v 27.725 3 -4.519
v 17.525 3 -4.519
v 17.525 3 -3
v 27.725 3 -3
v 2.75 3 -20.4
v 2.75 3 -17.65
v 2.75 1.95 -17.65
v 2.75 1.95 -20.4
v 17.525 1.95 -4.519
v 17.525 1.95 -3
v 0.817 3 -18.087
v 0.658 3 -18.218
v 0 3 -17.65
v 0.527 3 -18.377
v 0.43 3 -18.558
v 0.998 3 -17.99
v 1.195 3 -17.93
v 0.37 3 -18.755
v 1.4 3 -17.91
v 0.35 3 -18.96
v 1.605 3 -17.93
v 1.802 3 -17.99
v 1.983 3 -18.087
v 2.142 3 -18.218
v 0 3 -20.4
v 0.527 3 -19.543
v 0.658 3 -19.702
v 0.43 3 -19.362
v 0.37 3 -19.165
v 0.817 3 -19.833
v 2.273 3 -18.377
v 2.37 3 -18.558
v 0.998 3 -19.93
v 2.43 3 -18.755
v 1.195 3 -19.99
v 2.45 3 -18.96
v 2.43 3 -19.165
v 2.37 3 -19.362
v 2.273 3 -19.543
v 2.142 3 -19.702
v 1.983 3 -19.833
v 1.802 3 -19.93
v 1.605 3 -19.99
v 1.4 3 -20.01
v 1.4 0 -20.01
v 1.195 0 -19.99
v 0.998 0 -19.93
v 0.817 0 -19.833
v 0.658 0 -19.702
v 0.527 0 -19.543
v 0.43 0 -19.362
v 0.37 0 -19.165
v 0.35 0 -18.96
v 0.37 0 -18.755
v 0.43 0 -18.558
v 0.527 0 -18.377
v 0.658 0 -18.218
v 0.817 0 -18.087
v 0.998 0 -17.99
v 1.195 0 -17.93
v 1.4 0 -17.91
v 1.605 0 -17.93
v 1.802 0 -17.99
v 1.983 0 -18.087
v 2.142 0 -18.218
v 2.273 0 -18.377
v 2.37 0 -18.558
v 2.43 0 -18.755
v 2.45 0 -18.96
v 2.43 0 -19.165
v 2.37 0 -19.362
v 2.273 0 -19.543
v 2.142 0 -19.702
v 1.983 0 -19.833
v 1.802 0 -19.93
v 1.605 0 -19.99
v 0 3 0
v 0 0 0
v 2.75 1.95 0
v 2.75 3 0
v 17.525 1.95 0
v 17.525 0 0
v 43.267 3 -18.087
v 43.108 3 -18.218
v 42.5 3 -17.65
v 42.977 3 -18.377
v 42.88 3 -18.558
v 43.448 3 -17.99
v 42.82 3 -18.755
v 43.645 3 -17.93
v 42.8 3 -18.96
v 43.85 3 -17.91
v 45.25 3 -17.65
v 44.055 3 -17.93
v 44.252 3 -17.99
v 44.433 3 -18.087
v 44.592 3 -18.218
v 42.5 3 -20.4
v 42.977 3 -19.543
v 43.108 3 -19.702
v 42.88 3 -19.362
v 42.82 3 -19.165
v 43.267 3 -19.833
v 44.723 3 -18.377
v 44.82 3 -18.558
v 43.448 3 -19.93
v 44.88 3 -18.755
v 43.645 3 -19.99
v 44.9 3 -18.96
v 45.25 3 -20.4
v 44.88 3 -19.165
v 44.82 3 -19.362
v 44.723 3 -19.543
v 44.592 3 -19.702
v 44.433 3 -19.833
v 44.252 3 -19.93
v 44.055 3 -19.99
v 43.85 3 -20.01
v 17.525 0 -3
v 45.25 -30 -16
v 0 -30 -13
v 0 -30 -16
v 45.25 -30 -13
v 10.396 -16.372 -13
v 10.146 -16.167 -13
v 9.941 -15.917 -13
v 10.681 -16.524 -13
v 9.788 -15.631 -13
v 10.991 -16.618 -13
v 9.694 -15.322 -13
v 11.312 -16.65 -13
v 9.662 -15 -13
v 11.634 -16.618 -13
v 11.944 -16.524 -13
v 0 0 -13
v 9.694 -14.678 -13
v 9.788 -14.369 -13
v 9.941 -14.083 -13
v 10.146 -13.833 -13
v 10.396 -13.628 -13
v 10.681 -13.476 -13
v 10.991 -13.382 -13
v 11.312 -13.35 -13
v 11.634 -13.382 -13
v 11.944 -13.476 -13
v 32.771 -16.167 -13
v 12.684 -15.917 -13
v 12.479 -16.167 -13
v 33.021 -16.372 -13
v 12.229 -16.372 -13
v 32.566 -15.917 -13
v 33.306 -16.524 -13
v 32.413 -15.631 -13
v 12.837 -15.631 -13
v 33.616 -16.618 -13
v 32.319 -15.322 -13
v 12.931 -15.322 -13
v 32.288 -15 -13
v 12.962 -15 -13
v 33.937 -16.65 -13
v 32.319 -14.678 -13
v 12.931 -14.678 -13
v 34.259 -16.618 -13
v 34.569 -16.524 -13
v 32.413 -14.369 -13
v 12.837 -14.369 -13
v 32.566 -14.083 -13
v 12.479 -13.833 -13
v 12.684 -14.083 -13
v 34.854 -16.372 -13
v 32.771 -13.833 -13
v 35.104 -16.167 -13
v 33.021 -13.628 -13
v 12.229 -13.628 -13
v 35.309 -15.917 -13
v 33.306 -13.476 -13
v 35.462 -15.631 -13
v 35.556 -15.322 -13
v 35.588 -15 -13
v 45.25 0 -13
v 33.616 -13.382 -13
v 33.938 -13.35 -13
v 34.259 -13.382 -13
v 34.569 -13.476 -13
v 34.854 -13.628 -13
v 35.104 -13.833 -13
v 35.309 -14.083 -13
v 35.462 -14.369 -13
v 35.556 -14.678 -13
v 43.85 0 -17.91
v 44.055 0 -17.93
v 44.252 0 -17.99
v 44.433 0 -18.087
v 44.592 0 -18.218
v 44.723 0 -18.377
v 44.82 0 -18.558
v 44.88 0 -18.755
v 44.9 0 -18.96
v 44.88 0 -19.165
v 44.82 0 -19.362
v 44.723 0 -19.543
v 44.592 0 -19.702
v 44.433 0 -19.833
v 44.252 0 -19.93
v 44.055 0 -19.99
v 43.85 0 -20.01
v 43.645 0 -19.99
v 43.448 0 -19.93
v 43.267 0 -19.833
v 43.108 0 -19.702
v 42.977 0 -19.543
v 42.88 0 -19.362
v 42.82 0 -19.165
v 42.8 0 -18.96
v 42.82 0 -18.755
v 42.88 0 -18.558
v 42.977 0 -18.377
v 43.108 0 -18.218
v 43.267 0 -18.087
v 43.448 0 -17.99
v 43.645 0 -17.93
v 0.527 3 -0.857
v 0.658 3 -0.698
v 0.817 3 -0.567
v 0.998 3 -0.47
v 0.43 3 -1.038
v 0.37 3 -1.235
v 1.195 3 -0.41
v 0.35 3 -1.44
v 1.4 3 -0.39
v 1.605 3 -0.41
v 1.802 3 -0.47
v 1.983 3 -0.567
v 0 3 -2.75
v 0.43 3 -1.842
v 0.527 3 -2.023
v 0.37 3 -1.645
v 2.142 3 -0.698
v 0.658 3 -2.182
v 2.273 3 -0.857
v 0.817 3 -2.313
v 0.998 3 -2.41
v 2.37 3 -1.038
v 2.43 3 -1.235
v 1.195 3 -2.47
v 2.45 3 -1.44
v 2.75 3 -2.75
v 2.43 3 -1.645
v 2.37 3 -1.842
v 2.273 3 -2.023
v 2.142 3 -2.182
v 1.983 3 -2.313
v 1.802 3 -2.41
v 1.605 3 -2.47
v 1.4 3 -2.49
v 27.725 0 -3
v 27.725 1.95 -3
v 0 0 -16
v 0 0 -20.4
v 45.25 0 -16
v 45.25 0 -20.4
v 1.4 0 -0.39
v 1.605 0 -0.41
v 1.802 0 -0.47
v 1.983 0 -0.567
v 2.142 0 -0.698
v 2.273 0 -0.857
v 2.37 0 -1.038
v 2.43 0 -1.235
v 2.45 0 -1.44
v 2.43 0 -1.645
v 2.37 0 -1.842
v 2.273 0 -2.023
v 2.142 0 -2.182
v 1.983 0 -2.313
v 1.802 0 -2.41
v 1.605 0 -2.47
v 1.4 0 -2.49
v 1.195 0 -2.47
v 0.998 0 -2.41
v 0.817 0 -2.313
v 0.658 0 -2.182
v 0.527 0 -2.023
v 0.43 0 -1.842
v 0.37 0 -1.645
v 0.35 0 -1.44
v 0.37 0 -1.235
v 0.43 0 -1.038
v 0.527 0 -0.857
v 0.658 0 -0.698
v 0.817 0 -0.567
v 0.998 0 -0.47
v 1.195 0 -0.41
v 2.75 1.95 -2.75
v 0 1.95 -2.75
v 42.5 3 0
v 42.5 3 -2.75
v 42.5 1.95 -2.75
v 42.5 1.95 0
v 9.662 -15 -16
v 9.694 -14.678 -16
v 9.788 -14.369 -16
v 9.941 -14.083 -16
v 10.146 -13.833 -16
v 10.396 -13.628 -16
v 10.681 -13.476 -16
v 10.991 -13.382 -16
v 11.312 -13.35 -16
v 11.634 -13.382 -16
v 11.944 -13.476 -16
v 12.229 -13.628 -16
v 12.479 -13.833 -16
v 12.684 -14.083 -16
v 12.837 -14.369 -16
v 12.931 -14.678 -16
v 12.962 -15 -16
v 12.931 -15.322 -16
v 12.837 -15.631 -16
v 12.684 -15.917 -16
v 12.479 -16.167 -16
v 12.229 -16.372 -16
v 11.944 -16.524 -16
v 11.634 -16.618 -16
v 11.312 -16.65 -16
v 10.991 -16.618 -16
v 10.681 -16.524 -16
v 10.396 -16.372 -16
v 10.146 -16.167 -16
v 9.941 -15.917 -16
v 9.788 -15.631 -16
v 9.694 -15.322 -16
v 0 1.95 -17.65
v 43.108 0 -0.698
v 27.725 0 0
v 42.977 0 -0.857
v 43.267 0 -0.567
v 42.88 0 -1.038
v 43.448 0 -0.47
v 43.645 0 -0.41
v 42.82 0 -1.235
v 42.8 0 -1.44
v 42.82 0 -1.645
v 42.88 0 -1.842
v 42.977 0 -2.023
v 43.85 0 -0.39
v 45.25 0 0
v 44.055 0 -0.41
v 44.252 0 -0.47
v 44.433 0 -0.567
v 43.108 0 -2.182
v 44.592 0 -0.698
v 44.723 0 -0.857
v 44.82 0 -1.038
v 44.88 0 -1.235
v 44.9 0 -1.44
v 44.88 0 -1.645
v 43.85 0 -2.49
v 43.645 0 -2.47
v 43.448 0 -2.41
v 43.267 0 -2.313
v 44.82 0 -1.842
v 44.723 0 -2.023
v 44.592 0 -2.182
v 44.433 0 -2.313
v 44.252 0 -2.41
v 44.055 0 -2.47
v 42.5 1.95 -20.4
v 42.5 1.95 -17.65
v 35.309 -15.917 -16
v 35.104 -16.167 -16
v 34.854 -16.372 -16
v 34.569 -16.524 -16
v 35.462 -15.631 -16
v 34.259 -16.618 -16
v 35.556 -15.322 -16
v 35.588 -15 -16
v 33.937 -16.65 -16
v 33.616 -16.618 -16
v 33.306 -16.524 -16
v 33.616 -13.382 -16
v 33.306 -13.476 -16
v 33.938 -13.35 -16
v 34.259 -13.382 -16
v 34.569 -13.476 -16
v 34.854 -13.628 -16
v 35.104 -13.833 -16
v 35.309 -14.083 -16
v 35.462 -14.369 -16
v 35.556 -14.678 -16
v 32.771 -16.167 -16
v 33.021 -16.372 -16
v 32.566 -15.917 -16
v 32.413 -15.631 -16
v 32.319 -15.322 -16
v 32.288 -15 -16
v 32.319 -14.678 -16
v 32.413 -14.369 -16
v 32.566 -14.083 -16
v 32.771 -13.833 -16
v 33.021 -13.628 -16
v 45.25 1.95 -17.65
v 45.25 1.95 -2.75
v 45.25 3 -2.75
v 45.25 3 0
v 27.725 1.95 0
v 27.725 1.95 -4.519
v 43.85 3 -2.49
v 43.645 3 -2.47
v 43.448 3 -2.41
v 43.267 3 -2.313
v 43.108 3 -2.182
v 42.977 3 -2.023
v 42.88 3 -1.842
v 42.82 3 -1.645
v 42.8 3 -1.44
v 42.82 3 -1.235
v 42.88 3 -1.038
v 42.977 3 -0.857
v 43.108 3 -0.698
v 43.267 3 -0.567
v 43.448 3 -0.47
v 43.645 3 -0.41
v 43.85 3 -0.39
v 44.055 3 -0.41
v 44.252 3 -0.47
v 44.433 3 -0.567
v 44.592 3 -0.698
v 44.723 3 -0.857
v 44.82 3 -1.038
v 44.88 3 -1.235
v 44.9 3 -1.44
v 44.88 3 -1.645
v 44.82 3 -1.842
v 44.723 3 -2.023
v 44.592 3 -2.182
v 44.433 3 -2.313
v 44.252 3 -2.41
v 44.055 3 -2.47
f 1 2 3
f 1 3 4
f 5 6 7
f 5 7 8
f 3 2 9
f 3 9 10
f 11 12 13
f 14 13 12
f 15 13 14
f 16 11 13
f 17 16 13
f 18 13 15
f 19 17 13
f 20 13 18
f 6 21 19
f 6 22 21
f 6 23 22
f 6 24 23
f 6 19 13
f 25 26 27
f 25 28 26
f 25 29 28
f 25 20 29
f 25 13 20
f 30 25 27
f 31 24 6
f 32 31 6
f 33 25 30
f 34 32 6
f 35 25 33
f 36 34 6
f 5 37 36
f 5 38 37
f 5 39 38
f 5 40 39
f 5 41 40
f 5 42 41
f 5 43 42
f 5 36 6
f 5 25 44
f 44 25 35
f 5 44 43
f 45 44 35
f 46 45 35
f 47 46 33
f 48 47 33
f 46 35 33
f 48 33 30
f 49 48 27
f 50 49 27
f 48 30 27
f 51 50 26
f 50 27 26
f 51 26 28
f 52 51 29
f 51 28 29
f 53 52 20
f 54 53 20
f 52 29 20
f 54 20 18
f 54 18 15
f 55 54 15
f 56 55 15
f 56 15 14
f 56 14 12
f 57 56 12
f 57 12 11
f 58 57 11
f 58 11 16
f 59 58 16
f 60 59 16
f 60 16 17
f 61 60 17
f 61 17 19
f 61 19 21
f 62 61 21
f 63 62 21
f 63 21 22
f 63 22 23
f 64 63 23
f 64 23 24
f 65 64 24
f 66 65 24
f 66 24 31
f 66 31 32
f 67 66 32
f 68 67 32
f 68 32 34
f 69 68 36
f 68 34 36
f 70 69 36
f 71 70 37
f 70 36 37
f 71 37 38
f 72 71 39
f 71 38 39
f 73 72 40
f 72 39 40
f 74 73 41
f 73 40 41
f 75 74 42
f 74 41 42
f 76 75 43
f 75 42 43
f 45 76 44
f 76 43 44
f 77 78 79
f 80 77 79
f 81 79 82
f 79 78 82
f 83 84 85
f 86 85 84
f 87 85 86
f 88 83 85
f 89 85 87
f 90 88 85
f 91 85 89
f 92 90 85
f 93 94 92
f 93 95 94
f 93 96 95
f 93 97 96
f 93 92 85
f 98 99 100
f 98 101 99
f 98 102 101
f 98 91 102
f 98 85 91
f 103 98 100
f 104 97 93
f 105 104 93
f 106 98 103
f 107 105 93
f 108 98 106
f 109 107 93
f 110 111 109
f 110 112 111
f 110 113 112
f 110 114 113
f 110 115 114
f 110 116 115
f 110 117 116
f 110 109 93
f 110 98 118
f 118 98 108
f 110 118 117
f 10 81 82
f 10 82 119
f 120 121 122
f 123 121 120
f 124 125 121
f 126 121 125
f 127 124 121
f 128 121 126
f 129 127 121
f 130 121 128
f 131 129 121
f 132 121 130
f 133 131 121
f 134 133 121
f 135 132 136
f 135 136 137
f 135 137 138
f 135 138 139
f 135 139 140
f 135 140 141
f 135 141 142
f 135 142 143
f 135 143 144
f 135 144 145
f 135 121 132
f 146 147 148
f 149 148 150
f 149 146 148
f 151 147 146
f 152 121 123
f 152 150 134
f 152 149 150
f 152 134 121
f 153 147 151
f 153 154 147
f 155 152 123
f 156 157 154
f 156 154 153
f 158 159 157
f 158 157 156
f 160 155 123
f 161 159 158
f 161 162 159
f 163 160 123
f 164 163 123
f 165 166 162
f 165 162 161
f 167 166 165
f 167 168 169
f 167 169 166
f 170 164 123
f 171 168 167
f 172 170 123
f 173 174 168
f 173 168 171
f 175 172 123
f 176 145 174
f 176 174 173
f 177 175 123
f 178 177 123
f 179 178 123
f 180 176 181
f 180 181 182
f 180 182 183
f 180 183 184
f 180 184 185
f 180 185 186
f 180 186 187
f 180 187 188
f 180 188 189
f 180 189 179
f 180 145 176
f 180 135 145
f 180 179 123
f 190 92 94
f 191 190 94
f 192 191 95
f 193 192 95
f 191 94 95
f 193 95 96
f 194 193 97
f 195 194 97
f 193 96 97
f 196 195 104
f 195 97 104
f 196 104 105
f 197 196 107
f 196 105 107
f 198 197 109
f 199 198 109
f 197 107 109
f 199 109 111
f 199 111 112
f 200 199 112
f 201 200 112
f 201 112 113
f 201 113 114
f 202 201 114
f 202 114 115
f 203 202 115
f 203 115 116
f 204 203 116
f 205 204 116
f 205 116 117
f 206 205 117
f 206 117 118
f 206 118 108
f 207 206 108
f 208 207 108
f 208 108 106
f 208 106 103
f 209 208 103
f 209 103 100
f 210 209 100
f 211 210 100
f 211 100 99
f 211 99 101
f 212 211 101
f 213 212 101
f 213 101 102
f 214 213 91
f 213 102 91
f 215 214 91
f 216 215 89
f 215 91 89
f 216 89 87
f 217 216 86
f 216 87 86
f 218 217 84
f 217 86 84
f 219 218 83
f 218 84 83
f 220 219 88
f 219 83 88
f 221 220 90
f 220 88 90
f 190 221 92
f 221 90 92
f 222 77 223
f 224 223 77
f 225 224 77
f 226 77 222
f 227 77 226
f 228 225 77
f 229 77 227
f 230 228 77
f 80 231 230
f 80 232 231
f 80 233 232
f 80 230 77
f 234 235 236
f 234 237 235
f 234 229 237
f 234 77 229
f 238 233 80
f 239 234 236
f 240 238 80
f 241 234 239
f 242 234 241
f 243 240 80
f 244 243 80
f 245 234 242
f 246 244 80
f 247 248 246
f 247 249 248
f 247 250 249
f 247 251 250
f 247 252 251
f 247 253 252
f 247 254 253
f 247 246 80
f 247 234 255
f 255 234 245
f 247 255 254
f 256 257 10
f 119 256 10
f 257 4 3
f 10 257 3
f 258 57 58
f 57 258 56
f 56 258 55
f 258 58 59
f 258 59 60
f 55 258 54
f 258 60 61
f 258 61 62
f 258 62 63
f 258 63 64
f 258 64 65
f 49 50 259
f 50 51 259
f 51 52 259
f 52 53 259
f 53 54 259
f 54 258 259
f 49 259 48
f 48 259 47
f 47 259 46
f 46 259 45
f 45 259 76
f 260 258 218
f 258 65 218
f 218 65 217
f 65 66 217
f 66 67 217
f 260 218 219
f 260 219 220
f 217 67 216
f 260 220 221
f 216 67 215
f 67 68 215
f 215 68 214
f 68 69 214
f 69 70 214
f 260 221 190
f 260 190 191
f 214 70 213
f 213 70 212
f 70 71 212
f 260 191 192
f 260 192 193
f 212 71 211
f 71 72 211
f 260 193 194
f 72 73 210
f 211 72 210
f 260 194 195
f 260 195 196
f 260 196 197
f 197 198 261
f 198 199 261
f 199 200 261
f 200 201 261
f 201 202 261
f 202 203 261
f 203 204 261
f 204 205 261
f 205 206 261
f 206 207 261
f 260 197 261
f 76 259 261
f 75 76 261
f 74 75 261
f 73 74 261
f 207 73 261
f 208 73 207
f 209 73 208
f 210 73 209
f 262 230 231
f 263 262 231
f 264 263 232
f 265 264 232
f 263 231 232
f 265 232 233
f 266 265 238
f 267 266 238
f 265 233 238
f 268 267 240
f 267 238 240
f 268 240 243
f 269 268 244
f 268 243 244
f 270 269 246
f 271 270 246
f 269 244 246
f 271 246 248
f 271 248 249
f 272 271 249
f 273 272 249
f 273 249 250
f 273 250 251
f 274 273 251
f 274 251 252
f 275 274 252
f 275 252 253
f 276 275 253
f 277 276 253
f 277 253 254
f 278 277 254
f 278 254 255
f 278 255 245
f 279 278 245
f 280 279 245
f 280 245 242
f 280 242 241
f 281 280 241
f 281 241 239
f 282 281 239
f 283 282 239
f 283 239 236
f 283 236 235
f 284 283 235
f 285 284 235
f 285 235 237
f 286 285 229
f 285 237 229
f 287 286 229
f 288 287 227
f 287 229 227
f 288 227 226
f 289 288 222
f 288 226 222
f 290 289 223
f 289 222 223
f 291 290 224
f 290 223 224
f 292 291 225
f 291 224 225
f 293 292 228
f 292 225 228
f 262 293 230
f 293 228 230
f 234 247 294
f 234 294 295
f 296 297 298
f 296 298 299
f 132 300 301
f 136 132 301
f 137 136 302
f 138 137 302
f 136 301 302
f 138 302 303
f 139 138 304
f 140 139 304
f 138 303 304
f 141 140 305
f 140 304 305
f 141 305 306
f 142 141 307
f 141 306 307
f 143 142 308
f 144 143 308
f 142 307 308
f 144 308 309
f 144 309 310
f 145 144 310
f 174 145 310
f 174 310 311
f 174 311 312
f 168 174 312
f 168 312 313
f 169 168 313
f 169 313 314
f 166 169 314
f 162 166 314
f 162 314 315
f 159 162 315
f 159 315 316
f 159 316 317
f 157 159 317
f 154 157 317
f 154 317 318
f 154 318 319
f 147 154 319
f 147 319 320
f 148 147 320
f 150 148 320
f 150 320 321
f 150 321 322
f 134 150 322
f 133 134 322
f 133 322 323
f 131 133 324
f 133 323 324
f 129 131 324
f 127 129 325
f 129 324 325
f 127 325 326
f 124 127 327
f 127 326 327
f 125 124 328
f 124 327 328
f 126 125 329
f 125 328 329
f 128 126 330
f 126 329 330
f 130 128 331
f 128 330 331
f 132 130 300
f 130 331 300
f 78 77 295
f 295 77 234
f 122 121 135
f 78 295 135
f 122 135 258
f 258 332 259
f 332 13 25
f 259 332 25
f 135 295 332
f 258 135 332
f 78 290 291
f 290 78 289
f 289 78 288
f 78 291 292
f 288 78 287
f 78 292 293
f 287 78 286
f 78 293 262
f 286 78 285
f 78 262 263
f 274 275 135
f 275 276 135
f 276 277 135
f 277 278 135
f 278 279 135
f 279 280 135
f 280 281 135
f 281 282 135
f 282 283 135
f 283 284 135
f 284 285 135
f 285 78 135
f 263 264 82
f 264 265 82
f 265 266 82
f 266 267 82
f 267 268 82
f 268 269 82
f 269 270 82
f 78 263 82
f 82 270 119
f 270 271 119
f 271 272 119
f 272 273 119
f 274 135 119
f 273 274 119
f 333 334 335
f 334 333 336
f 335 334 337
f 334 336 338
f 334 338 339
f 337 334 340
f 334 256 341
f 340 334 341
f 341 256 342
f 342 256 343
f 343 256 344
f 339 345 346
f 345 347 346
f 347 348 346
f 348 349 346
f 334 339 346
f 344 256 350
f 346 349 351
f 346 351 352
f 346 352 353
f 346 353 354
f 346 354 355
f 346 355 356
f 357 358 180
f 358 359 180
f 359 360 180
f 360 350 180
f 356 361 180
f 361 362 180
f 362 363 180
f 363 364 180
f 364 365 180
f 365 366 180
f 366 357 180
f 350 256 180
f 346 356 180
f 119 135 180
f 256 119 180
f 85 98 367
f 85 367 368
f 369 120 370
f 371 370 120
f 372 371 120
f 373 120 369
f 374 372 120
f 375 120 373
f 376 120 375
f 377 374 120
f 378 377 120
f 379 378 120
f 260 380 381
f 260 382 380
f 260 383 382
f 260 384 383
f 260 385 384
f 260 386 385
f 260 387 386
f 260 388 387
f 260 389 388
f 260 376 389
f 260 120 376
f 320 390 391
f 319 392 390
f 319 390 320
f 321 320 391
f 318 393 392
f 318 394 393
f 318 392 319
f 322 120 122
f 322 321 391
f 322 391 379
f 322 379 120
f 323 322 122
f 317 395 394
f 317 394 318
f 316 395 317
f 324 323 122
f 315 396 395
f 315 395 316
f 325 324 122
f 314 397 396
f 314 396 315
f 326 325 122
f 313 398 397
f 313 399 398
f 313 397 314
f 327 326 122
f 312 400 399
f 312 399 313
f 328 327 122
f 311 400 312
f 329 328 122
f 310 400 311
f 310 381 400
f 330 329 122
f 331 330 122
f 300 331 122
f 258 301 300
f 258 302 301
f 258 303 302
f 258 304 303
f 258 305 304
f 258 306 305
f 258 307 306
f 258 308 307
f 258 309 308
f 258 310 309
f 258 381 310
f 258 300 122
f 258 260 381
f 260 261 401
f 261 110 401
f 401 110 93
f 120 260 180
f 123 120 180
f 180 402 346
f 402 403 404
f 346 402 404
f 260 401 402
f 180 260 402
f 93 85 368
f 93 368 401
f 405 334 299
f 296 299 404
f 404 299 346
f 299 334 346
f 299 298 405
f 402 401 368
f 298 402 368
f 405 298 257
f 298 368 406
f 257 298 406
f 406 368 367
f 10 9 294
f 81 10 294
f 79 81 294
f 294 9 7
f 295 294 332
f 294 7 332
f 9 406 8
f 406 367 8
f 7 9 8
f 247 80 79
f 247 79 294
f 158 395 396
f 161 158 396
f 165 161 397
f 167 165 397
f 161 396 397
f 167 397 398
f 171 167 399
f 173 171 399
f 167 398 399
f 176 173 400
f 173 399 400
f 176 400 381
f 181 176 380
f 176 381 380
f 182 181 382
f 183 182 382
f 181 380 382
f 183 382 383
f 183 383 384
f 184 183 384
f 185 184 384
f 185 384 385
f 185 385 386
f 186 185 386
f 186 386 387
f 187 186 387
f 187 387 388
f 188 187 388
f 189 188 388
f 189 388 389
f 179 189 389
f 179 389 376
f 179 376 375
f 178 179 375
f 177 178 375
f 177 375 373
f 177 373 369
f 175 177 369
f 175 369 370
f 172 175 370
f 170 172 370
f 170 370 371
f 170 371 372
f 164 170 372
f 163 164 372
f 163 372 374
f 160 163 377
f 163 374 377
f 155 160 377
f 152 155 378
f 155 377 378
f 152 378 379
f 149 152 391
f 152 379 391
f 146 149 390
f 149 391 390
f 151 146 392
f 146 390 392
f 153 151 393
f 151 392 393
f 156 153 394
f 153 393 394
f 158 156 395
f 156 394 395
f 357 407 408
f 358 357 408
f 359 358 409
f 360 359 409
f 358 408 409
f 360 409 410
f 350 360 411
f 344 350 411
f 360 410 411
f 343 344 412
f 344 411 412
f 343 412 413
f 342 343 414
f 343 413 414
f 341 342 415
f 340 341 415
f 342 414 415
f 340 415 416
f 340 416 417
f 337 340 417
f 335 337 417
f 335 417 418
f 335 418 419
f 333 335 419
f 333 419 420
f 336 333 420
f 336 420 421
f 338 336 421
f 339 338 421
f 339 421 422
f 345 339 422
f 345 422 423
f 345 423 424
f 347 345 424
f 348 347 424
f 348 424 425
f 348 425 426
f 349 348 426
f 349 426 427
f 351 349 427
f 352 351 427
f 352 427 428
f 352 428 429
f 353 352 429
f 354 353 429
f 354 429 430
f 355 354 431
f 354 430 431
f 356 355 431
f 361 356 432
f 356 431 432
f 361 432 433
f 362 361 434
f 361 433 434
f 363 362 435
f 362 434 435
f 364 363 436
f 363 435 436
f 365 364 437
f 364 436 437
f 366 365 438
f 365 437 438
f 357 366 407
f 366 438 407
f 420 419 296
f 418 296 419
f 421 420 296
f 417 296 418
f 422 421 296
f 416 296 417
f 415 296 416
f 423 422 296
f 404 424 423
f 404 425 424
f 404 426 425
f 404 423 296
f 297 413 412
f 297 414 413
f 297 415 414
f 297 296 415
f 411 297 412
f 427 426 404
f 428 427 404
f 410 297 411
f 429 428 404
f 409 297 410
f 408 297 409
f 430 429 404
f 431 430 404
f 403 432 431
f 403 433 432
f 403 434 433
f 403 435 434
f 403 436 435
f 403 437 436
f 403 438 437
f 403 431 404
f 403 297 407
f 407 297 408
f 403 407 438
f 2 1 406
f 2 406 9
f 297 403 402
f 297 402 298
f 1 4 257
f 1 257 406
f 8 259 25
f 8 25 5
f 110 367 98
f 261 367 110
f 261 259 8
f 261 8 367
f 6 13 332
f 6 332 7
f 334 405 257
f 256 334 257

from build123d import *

# Parameters (mm, degrees)
CROQUIS1_W              = 45.25
CROQUIS1_H              = 20.4
SALIENTE_EXTRUIR1_DEPTH = 3
CROQUIS2_W              = 10.2
CROQUIS2_H              = 3
CORTAR_EXTRUIR1_DEPTH   = 50.726476851
CORTAR_EXTRUIR2_DEPTH   = 1.05
CROQUIS5_R              = 1.05
CORTAR_EXTRUIR4_DEPTH   = 50.726476851
SALIENTE_EXTRUIR2_DEPTH = 30
CROQUIS8_W              = 45.25
CROQUIS8_H              = 30
CORTAR_EXTRUIR5_DEPTH   = 10
CROQUIS10_R             = 1.65
CORTAR_EXTRUIR6_DEPTH   = 58.197574249
CROQUIS11_W             = 45.25
CROQUIS11_H             = 30
CORTAR_EXTRUIR7_DEPTH   = 2


with BuildPart() as part:
    # Croquis1 → Saliente-Extruir1 (new body)
    with BuildSketch(Plane(origin=(0, 0, 0), x_dir=(1, 0, 0), z_dir=(0, 1, 0))):
        with Locations((22.625, 10.2)):
            Rectangle(CROQUIS1_W, CROQUIS1_H)
    extrude(amount=SALIENTE_EXTRUIR1_DEPTH)

    # Croquis2 → Cortar-Extruir1 (cut, through all)
    with BuildSketch(Plane(origin=(0, 3, 0), x_dir=(1, 0, 0), z_dir=(0, 1, 0))):
        with Locations((22.625, 1.5)):
            Rectangle(CROQUIS2_W, CROQUIS2_H)
    extrude(amount=-CORTAR_EXTRUIR1_DEPTH, mode=Mode.SUBTRACT)

    # Croquis3 → Cortar-Extruir2 (cut)
    with BuildSketch(Plane(origin=(0, 3, 0), x_dir=(1, 0, 0), z_dir=(0, 1, 0))):
        Polygon((42.5, 0), (27.725, 0), (27.725, 4.51852132), (17.525, 4.51852132), (17.525, 0), (2.75, 0), (2.75, 2.75), (0, 2.75), (0, 17.65), (2.75, 17.65), (2.75, 20.4), (42.5, 20.4), (42.5, 17.65), (45.25, 17.65), (45.25, 2.75), (42.5, 2.75), align=None)
    extrude(amount=-CORTAR_EXTRUIR2_DEPTH, mode=Mode.SUBTRACT)

    # Croquis5 → Cortar-Extruir4 (cut, through all)
    with BuildSketch(Plane(origin=(0, 3, 0), x_dir=(1, 0, 0), z_dir=(0, 1, 0))):
        with Locations(Location((43.85, 18.96, 0), (0, 0, 270))):
            Circle(CROQUIS5_R)
        with Locations(Location((1.4, 18.96, 0), (0, 0, 90))):
            Circle(CROQUIS5_R)
        with Locations(Location((43.85, 1.44, 0), (0, 0, 90))):
            Circle(CROQUIS5_R)
        with Locations(Location((1.4, 1.44, 0), (0, 0, 270))):
            Circle(CROQUIS5_R)
    extrude(amount=-CORTAR_EXTRUIR4_DEPTH, mode=Mode.SUBTRACT)

    # Croquis6 → Saliente-Extruir2 (add)
    with BuildSketch(Plane.XZ):
        Polygon((17.525, -3), (0, -3), (0, -18), (45.25, -18), (45.25, -3), align=None)
    extrude(amount=SALIENTE_EXTRUIR2_DEPTH)

    # Croquis8 → Cortar-Extruir5 (cut)
    with BuildSketch(Plane.XY.offset(-3)):
        with Locations((22.625, -15)):
            Rectangle(CROQUIS8_W, CROQUIS8_H)
    extrude(amount=-CORTAR_EXTRUIR5_DEPTH, mode=Mode.SUBTRACT)

    # Croquis10 → Cortar-Extruir6 (cut, through all)
    with BuildSketch(Plane(origin=(0, 0, -18), x_dir=(-1, 0, 0), z_dir=(0, 0, -1))):
        with Locations((-11.3125, -15)):
            Circle(CROQUIS10_R)
        with Locations((-33.9375, -15)):
            Circle(CROQUIS10_R)
    extrude(amount=-CORTAR_EXTRUIR6_DEPTH, mode=Mode.SUBTRACT)

    # Croquis11 → Cortar-Extruir7 (cut)
    with BuildSketch(Plane(origin=(0, 0, -18), x_dir=(-1, 0, 0), z_dir=(0, 0, -1))):
        with Locations((-22.625, -15)):
            Rectangle(CROQUIS11_W, CROQUIS11_H)
    extrude(amount=-CORTAR_EXTRUIR7_DEPTH, mode=Mode.SUBTRACT)


solid = part.part
